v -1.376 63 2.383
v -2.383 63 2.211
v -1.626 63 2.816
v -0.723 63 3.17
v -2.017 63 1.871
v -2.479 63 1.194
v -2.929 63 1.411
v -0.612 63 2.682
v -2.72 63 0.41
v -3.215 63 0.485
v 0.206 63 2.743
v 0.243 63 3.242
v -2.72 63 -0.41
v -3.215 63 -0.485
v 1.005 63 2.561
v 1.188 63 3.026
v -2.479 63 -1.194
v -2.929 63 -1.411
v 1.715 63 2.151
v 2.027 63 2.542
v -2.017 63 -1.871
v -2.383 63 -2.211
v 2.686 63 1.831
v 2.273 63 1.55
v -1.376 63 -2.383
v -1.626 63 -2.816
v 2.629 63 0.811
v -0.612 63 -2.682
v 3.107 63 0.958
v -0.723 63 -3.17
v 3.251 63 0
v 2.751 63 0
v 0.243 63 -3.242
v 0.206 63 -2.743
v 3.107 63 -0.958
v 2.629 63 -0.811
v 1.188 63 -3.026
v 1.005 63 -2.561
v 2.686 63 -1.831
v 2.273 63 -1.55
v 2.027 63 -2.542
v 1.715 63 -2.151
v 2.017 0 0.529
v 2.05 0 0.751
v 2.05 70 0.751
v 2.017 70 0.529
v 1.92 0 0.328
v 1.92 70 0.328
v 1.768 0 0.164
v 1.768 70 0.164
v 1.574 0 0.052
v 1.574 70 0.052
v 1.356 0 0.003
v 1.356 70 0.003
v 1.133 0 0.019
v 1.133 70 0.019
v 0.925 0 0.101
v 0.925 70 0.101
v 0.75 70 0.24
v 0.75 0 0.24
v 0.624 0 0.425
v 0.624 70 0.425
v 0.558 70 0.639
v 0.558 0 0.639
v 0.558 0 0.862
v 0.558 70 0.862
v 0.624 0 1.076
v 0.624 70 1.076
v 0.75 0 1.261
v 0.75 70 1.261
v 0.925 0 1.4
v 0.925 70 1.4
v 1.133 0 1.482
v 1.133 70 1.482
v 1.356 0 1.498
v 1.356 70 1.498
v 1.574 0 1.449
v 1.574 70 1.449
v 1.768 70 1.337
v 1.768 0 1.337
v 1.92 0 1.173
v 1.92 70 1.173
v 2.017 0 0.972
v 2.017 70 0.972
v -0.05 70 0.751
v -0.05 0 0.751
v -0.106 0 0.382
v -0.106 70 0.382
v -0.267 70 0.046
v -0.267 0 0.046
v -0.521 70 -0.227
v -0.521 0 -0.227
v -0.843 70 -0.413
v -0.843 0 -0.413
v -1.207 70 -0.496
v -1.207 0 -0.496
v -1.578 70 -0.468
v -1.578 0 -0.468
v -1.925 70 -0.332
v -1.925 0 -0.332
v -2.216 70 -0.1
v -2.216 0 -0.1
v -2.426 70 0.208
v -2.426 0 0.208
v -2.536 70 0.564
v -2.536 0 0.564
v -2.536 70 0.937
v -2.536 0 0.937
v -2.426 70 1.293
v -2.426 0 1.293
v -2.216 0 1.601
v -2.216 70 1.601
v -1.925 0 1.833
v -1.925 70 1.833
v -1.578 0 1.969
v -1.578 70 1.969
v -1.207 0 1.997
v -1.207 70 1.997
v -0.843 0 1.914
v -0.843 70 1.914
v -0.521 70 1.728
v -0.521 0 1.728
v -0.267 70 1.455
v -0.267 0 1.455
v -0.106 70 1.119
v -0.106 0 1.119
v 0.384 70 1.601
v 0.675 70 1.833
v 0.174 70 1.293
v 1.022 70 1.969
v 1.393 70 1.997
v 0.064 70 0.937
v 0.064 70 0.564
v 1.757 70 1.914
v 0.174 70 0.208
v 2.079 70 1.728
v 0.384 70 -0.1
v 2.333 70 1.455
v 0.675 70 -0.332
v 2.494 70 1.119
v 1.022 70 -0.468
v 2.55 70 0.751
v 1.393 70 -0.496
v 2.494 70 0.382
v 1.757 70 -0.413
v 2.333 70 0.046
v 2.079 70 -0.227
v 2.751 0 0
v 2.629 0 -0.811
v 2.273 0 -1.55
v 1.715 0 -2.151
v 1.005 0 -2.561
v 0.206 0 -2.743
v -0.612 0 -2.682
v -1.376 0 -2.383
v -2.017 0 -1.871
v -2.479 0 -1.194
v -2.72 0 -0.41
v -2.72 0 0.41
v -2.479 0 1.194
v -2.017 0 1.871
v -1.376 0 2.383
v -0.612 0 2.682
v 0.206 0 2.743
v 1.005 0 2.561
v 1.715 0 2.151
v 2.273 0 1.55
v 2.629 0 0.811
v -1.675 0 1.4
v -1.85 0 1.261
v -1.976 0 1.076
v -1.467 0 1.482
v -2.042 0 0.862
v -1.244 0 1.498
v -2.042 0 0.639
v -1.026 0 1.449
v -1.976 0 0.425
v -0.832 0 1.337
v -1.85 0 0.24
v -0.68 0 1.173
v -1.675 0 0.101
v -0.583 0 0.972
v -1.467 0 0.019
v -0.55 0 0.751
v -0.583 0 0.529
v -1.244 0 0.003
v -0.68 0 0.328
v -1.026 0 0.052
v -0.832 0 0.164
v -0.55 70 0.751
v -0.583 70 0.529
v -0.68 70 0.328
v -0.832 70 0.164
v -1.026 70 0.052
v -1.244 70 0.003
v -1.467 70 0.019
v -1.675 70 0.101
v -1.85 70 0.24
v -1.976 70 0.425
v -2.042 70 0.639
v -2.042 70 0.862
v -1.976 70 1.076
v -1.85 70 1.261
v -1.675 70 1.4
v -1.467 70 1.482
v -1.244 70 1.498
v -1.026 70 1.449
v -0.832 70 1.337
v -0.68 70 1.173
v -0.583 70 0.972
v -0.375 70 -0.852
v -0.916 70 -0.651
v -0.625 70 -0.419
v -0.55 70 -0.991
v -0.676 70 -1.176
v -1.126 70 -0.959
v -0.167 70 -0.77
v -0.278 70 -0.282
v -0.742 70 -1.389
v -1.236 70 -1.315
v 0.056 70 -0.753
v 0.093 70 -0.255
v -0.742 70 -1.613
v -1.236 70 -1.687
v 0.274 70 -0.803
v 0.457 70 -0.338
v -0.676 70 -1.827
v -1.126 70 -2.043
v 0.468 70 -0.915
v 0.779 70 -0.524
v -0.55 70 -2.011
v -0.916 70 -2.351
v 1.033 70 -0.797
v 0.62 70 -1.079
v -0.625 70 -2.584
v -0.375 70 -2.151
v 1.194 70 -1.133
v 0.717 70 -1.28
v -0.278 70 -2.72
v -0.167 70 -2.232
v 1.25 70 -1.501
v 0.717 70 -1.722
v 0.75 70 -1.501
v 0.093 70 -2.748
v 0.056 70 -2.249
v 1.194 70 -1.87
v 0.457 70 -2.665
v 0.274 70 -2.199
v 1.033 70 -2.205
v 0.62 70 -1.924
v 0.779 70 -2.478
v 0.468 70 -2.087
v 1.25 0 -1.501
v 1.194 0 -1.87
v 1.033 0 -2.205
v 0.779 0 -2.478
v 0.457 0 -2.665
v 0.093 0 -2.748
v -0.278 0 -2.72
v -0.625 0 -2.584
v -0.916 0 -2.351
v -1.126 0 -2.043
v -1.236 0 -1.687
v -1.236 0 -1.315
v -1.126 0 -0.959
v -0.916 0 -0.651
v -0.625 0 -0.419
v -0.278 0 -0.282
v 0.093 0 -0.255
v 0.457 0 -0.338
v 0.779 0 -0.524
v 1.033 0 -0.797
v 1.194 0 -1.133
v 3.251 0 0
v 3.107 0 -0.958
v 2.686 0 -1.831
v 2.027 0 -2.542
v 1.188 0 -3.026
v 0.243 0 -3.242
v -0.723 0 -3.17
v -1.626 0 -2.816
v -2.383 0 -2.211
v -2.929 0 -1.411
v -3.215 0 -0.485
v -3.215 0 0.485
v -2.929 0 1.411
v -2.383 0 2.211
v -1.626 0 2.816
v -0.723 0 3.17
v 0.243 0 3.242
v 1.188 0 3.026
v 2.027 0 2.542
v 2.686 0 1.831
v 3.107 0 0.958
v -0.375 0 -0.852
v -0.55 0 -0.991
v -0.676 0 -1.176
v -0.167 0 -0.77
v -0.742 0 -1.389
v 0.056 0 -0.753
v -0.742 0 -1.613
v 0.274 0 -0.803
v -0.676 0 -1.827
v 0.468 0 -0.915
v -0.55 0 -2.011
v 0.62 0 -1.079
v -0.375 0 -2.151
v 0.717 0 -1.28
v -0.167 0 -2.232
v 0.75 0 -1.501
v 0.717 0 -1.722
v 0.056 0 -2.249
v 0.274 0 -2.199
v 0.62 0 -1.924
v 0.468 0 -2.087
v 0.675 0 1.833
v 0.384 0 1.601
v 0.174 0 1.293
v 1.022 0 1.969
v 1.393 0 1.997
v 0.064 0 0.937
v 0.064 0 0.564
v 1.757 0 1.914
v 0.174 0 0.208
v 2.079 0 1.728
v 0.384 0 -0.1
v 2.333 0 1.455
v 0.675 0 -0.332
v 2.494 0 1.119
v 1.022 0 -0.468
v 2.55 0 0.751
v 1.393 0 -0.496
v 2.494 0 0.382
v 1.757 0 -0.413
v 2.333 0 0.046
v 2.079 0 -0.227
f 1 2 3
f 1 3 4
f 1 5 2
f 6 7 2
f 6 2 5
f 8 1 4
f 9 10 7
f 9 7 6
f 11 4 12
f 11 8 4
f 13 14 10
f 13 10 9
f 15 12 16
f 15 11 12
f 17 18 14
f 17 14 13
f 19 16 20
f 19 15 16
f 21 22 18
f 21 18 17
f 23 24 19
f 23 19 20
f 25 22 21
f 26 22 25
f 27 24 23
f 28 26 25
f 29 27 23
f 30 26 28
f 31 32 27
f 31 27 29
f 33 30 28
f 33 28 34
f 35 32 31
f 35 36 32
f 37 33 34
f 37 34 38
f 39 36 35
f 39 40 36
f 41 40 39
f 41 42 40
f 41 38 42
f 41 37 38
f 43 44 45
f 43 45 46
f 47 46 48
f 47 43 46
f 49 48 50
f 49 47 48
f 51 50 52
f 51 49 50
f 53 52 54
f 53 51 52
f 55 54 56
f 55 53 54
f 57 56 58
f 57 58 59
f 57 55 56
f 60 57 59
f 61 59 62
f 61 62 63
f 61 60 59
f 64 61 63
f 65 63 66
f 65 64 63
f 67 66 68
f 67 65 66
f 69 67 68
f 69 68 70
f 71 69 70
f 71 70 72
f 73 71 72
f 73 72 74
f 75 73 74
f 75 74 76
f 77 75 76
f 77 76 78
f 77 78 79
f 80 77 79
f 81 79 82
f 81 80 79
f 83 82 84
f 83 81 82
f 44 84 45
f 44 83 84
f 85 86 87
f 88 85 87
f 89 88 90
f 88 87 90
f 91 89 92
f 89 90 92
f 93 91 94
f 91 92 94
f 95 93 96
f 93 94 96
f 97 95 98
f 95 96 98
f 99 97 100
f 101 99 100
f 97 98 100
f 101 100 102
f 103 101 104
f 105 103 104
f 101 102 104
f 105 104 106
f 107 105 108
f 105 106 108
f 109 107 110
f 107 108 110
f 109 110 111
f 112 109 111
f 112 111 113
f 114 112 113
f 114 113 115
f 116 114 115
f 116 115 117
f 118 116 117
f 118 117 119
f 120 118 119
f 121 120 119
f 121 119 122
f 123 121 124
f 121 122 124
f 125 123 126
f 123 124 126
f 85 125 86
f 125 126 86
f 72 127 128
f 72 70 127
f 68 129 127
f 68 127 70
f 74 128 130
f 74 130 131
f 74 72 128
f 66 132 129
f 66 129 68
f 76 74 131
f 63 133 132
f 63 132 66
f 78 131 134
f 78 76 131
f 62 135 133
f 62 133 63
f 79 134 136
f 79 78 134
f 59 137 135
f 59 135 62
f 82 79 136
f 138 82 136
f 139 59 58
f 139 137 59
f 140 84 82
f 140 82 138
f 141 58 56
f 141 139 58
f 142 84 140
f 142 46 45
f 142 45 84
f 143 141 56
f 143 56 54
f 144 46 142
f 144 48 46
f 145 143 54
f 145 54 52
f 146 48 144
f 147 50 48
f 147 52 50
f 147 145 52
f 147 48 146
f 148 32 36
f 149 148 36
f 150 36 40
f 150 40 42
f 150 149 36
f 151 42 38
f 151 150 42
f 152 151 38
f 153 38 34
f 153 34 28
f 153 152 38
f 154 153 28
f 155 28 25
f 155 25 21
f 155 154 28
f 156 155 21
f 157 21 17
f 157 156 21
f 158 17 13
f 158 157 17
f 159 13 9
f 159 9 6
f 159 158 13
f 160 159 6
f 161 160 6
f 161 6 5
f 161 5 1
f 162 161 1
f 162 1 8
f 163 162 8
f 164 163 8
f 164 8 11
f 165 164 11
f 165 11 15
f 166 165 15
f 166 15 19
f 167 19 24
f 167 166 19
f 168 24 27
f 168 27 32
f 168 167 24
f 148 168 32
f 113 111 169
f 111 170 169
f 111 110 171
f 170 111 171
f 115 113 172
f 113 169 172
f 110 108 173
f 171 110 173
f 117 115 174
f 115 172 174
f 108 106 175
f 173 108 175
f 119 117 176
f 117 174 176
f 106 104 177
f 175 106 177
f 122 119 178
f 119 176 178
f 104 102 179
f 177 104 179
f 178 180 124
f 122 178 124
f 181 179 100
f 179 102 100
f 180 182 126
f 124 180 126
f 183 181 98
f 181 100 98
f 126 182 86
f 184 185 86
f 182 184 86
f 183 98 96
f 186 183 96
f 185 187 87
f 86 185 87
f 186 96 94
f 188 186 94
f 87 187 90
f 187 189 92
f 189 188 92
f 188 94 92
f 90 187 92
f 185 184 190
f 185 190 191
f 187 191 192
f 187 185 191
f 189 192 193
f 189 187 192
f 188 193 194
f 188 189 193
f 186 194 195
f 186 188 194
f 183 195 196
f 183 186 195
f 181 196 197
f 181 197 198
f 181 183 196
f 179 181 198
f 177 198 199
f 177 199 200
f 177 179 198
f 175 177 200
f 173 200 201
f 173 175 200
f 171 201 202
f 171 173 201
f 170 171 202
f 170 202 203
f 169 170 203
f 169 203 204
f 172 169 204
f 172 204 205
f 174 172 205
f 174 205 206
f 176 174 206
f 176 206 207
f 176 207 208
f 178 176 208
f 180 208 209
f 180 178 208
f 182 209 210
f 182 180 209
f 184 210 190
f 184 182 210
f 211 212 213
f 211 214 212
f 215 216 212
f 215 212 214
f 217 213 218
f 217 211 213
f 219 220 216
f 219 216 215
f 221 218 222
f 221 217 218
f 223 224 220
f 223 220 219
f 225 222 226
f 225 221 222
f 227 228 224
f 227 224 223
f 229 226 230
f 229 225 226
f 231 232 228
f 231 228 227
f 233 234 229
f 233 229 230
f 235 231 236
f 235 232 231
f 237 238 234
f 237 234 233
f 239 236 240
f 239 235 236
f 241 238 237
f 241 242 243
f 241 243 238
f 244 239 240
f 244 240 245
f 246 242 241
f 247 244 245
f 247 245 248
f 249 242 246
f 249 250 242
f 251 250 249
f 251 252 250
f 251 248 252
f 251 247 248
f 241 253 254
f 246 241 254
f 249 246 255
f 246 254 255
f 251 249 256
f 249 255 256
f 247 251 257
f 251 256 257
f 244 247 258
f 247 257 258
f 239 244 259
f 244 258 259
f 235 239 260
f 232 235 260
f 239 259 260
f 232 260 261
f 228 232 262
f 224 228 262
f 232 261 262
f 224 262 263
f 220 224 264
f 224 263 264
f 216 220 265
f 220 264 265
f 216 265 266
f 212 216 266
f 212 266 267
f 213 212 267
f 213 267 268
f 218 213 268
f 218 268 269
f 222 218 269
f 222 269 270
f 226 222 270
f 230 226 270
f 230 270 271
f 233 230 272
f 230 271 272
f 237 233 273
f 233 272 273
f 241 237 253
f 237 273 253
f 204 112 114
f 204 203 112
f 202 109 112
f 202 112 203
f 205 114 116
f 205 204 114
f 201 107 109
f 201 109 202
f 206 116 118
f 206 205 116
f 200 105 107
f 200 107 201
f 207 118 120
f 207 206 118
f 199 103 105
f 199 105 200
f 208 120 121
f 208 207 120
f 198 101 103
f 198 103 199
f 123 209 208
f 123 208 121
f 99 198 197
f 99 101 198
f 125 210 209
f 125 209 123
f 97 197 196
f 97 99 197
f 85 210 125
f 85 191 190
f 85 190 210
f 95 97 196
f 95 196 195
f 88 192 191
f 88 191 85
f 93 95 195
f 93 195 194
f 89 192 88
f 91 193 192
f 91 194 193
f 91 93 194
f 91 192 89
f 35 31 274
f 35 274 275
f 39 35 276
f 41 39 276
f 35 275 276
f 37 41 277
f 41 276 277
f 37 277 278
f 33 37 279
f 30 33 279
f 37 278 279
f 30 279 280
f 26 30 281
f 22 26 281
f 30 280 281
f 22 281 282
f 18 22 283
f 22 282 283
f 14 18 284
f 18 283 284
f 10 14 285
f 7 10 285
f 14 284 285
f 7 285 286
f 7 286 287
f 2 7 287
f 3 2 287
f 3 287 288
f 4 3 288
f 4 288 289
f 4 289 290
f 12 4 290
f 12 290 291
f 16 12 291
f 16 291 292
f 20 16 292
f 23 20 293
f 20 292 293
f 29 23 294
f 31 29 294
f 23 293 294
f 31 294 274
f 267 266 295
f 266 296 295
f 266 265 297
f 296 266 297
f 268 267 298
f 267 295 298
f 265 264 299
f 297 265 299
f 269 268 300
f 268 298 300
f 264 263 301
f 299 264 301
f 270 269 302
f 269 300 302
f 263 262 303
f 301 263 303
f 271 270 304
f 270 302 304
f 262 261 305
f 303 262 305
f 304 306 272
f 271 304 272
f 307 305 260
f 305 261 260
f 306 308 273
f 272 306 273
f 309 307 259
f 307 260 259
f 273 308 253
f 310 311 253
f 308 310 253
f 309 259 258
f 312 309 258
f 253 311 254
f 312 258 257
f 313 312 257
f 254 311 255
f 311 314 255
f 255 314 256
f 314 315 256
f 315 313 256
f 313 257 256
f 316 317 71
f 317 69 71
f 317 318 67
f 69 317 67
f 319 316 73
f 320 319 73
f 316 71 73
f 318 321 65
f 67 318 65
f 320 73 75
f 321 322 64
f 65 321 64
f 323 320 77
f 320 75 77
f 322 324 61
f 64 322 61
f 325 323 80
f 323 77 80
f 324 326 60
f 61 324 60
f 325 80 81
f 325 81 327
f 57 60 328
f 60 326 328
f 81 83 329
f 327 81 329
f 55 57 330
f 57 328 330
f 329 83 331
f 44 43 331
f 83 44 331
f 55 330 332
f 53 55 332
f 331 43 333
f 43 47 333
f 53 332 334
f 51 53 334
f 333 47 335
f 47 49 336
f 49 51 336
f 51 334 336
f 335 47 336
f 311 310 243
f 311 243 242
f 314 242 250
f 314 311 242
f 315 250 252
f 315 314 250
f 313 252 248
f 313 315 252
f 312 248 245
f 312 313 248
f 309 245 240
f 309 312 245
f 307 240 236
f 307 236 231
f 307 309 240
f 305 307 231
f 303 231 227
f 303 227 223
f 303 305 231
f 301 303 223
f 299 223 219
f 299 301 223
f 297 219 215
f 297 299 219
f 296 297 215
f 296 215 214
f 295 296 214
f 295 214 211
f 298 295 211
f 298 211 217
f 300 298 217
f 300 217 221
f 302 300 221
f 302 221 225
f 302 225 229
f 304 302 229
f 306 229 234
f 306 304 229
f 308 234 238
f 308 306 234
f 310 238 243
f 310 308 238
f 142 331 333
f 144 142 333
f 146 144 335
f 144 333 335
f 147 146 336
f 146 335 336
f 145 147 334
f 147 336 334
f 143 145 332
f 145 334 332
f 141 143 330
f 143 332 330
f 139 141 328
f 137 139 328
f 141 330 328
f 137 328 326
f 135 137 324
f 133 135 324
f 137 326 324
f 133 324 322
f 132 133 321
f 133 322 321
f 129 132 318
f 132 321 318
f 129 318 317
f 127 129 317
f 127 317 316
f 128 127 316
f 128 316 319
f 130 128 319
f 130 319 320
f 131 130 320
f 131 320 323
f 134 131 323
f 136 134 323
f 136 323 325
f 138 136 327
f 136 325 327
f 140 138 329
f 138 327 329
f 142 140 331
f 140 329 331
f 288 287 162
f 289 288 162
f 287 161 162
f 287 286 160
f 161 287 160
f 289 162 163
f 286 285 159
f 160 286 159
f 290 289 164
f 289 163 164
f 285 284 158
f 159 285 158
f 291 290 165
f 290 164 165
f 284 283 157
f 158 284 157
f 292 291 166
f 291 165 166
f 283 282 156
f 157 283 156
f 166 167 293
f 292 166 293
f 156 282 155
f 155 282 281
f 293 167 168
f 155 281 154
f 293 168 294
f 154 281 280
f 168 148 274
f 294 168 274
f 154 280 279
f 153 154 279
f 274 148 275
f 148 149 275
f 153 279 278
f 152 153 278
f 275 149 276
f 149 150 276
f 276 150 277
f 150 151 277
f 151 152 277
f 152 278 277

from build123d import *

# Parameters (mm, degrees)
SKETCH1_R             = 1.25
SKETCH1_R_2           = 0.75
BOSS_EXTRUDE1_DEPTH   = 70
BOSS_EXTRUDE1_2_DEPTH = 70
BOSS_EXTRUDE1_3_DEPTH = 70
SKETCH1_3_R           = 3.2511107
BOSS_EXTRUDE2_DEPTH   = 63


with BuildPart() as part:
    # Sketch1 → Boss-Extrude1 (new body)
    with BuildSketch(Plane(origin=(0, 0, 0), x_dir=(1, 0, 0), z_dir=(0, 1, 0))):
        with Locations((-1.3, -0.75055535)):
            Circle(SKETCH1_R)
        with Locations((-1.3, -0.75055535)):
            Circle(SKETCH1_R_2, mode=Mode.SUBTRACT)
    extrude(amount=BOSS_EXTRUDE1_DEPTH)


with BuildPart() as body_2:
    # Sketch1 → Boss-Extrude1 2 (new body)
    with BuildSketch(Plane(origin=(0, 0, 0), x_dir=(1, 0, 0), z_dir=(0, 1, 0))):
        with Locations((1.3, -0.75055535)):
            Circle(SKETCH1_R)
        with Locations((1.3, -0.75055535)):
            Circle(SKETCH1_R_2, mode=Mode.SUBTRACT)
    extrude(amount=BOSS_EXTRUDE1_2_DEPTH)


with BuildPart() as body_3:
    # Sketch1 → Boss-Extrude1 3 (new body)
    with BuildSketch(Plane(origin=(0, 0, 0), x_dir=(1, 0, 0), z_dir=(0, 1, 0))):
        with Locations((0, 1.5011107)):
            Circle(SKETCH1_R)
        with Locations((0, 1.5011107)):
            Circle(SKETCH1_R_2, mode=Mode.SUBTRACT)
    extrude(amount=BOSS_EXTRUDE1_3_DEPTH)


with BuildPart() as body_4:
    # Sketch1<3> → Boss-Extrude2 (new body)
    with BuildSketch(Plane(origin=(0, 0, 0), x_dir=(1, 0, 0), z_dir=(0, 1, 0))):
        Circle(SKETCH1_3_R)
        with BuildLine():
            ThreePointArc((2.382531738, -1.375555379), (-8e-09, -2.7511107), (-2.382531746, -1.375555364))
            ThreePointArc((-2.382531746, -1.375555364), (-2.382531759, 1.375555343), (0, 2.7511107))
            ThreePointArc((0, 2.7511107), (1.945329032, 1.945329032), (2.7511107, 0))
            ThreePointArc((2.7511107, 0), (2.657368872, -0.71203986), (2.382531738, -1.375555379))
        make_face(mode=Mode.SUBTRACT)
    extrude(amount=BOSS_EXTRUDE2_DEPTH)


solid = Compound([part.part, body_2.part, body_3.part, body_4.part])
